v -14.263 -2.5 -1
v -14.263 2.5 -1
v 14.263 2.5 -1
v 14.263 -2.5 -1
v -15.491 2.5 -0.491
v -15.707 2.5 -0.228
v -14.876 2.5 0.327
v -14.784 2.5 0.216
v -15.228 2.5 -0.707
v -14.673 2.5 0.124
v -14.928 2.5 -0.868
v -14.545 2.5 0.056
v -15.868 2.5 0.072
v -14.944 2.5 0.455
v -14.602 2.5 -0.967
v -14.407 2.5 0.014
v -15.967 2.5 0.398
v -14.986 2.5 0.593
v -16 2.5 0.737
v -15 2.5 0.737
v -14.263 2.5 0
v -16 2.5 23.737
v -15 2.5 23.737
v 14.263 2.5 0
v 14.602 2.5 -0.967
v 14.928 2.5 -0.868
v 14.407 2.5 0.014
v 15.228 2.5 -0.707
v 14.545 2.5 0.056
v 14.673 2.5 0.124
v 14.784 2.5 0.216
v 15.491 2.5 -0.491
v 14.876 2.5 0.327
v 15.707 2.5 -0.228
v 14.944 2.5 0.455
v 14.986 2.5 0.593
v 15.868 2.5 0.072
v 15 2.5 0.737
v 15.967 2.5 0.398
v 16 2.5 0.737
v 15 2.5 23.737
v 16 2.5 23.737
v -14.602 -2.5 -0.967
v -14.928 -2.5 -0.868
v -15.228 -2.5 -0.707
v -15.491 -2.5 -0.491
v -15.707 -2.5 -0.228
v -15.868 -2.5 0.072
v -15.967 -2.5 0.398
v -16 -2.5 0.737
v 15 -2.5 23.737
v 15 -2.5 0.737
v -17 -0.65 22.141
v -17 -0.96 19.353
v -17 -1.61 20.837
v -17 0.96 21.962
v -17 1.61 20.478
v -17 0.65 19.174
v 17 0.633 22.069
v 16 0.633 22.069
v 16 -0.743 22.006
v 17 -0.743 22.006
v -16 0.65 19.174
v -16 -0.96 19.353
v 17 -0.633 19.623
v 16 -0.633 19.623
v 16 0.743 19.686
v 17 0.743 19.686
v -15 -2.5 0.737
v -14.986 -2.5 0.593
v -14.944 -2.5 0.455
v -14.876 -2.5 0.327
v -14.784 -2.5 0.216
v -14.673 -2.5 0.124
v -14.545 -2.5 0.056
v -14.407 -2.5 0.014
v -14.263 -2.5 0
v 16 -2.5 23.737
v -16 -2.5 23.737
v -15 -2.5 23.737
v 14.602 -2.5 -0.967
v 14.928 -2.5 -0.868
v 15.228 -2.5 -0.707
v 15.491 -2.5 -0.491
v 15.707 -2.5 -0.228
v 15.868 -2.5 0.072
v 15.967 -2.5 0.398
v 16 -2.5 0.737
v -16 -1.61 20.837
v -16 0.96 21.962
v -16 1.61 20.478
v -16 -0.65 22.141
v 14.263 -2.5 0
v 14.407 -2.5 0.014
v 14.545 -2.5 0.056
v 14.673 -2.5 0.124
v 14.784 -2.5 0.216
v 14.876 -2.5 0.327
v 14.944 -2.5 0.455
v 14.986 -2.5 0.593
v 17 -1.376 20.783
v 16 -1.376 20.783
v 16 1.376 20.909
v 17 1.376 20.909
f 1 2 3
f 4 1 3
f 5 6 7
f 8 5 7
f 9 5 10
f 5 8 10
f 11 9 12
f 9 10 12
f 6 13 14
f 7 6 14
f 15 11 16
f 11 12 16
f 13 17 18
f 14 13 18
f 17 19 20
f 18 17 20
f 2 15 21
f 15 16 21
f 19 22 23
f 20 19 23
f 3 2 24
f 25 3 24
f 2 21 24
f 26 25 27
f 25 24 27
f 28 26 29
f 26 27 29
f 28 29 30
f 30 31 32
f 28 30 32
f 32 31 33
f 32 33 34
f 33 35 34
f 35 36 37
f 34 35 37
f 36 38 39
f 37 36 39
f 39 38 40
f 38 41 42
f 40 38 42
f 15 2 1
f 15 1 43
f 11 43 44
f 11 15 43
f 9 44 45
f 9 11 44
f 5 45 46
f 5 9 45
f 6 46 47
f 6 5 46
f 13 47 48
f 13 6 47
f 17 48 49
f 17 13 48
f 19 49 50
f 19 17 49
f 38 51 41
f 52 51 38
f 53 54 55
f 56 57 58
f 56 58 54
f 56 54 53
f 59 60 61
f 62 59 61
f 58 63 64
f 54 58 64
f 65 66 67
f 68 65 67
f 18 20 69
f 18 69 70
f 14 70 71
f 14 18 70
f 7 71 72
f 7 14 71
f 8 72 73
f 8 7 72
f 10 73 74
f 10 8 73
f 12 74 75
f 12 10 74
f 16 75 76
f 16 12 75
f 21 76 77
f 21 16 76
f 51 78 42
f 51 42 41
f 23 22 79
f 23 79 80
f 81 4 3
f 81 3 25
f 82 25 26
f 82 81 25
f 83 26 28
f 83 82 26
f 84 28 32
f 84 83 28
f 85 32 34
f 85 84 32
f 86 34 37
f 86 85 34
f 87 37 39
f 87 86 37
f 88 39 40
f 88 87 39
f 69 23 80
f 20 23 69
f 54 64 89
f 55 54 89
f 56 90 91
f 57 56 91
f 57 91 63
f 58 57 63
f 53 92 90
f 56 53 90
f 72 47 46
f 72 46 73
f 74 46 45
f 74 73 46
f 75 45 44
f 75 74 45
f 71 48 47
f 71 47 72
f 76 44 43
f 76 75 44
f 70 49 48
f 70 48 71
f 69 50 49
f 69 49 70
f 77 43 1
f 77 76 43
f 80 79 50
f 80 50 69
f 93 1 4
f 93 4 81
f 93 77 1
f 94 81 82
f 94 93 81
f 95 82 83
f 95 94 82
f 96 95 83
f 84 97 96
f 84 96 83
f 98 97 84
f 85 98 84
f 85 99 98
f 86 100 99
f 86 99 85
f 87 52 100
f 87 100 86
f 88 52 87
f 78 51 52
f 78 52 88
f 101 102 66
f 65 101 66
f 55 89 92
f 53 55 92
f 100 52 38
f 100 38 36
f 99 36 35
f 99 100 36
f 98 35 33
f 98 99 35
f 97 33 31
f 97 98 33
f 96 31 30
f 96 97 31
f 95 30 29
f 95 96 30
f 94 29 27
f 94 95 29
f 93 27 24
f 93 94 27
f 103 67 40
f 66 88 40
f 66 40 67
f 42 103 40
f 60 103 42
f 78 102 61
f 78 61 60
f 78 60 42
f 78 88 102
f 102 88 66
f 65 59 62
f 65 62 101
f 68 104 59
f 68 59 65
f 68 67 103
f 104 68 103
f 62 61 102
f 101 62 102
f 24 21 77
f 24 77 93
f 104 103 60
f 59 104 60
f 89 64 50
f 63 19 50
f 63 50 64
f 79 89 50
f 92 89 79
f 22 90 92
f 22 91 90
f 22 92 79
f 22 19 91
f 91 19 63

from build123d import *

# Parameters (mm, degrees)
SKETCH1_W                      = 32
SKETCH1_H                      = 5
BASE_FLANGE1_DEPTH             = 1
EDGE_FLANGE1_STRIP_W           = 5.4732
EDGE_FLANGE1_STRIP_H           = 1
EDGE_FLANGE1_STRIP_CUT_DEPTH   = 5
EDGE_FLANGE1_STRIP_2_W         = 5.4732
EDGE_FLANGE1_STRIP_2_H         = 1
EDGE_FLANGE1_STRIP_CUT_2_DEPTH = 5
EDGE_FLANGE1_DEPTH             = 5
EDGE_FLANGE1_BEND_DEPTH        = 5
BOSS_EXTRUDE1_DEPTH            = 1
BOSS_EXTRUDE2_DEPTH            = 1


# Sheet-metal steps are written as plain solids
with BuildPart() as part:
    # Sketch1 → Base-Flange1 (new body)
    with BuildSketch(Plane.XY):
        Rectangle(SKETCH1_W, SKETCH1_H)
    extrude(amount=-BASE_FLANGE1_DEPTH)

    # Edge-Flange1 strip (across the edge) → Edge-Flange1 strip cut (cut)
    with BuildSketch(Plane(origin=(-16, 2.5, 0), x_dir=(1, 0, 0), z_dir=(0, -1, 0))):
        with Locations((-1, -0.5)):
            Rectangle(EDGE_FLANGE1_STRIP_W, EDGE_FLANGE1_STRIP_H)
    extrude(amount=EDGE_FLANGE1_STRIP_CUT_DEPTH, mode=Mode.SUBTRACT)

    # Edge-Flange1 strip 2 (across the edge) → Edge-Flange1 strip cut 2 (cut)
    with BuildSketch(Plane(origin=(16, -2.5, 0), x_dir=(-1, 0, 0), z_dir=(0, 1, 0))):
        with Locations((-1, -0.5)):
            Rectangle(EDGE_FLANGE1_STRIP_2_W, EDGE_FLANGE1_STRIP_2_H)
    extrude(amount=EDGE_FLANGE1_STRIP_CUT_2_DEPTH, mode=Mode.SUBTRACT)

    # Edge-Flange1 section (across the edge) → Edge-Flange1 (add)
    with BuildSketch(Plane(origin=(-16, 2.5, 0), x_dir=(1, 0, 0), z_dir=(0, -1, 0))):
        with BuildLine():
            Line((0, 0.7366), (0, 23.7366))
            Line((0, 23.7366), (1, 23.7366))
            Line((1, 23.7366), (1, 0.7366))
            ThreePointArc((1, 0.7366), (1.215745145, 0.215745145), (1.7366, 0))
            Line((1.7366, 0), (1.7366, -1))
            ThreePointArc((1.7366, -1), (0.508638364, -0.491361636), (0, 0.7366))
        make_face()
    extrude(amount=EDGE_FLANGE1_DEPTH)

    # Edge-Flange1 section 2 (across the edge) → Edge-Flange1 bend (add)
    with BuildSketch(Plane(origin=(16, -2.5, 0), x_dir=(-1, 0, 0), z_dir=(0, 1, 0))):
        with BuildLine():
            Line((0, 0.7366), (0, 23.7366))
            Line((0, 23.7366), (1, 23.7366))
            Line((1, 23.7366), (1, 0.7366))
            ThreePointArc((1, 0.7366), (1.215745145, 0.215745145), (1.7366, 0))
            Line((1.7366, 0), (1.7366, -1))
            ThreePointArc((1.7366, -1), (0.508638364, -0.491361636), (0, 0.7366))
        make_face()
    extrude(amount=EDGE_FLANGE1_BEND_DEPTH)

    # Sketch12 → Boss-Extrude1 (add)
    with BuildSketch(Plane(origin=(16, 0, 0), x_dir=(0, 0, -1), z_dir=(1, 0, 0))):
        Polygon((-19.622935429, -0.632906062), (-19.686371165, 0.74277998), (-20.909468094, 1.375686043), (-22.069129286, 0.632906062), (-22.00569355, -0.74277998), (-20.782596622, -1.375686043), align=None)
    extrude(amount=BOSS_EXTRUDE1_DEPTH)

    # Sketch13 → Boss-Extrude2 (add)
    with BuildSketch(Plane.ZY.offset(16)):
        Polygon((22.141401041, -0.649858365), (21.962250454, 0.960156284), (20.478361573, 1.61001465), (19.17362328, 0.649858365), (19.352773867, -0.960156284), (20.836662748, -1.61001465), align=None)
    extrude(amount=BOSS_EXTRUDE2_DEPTH)


solid = part.part
